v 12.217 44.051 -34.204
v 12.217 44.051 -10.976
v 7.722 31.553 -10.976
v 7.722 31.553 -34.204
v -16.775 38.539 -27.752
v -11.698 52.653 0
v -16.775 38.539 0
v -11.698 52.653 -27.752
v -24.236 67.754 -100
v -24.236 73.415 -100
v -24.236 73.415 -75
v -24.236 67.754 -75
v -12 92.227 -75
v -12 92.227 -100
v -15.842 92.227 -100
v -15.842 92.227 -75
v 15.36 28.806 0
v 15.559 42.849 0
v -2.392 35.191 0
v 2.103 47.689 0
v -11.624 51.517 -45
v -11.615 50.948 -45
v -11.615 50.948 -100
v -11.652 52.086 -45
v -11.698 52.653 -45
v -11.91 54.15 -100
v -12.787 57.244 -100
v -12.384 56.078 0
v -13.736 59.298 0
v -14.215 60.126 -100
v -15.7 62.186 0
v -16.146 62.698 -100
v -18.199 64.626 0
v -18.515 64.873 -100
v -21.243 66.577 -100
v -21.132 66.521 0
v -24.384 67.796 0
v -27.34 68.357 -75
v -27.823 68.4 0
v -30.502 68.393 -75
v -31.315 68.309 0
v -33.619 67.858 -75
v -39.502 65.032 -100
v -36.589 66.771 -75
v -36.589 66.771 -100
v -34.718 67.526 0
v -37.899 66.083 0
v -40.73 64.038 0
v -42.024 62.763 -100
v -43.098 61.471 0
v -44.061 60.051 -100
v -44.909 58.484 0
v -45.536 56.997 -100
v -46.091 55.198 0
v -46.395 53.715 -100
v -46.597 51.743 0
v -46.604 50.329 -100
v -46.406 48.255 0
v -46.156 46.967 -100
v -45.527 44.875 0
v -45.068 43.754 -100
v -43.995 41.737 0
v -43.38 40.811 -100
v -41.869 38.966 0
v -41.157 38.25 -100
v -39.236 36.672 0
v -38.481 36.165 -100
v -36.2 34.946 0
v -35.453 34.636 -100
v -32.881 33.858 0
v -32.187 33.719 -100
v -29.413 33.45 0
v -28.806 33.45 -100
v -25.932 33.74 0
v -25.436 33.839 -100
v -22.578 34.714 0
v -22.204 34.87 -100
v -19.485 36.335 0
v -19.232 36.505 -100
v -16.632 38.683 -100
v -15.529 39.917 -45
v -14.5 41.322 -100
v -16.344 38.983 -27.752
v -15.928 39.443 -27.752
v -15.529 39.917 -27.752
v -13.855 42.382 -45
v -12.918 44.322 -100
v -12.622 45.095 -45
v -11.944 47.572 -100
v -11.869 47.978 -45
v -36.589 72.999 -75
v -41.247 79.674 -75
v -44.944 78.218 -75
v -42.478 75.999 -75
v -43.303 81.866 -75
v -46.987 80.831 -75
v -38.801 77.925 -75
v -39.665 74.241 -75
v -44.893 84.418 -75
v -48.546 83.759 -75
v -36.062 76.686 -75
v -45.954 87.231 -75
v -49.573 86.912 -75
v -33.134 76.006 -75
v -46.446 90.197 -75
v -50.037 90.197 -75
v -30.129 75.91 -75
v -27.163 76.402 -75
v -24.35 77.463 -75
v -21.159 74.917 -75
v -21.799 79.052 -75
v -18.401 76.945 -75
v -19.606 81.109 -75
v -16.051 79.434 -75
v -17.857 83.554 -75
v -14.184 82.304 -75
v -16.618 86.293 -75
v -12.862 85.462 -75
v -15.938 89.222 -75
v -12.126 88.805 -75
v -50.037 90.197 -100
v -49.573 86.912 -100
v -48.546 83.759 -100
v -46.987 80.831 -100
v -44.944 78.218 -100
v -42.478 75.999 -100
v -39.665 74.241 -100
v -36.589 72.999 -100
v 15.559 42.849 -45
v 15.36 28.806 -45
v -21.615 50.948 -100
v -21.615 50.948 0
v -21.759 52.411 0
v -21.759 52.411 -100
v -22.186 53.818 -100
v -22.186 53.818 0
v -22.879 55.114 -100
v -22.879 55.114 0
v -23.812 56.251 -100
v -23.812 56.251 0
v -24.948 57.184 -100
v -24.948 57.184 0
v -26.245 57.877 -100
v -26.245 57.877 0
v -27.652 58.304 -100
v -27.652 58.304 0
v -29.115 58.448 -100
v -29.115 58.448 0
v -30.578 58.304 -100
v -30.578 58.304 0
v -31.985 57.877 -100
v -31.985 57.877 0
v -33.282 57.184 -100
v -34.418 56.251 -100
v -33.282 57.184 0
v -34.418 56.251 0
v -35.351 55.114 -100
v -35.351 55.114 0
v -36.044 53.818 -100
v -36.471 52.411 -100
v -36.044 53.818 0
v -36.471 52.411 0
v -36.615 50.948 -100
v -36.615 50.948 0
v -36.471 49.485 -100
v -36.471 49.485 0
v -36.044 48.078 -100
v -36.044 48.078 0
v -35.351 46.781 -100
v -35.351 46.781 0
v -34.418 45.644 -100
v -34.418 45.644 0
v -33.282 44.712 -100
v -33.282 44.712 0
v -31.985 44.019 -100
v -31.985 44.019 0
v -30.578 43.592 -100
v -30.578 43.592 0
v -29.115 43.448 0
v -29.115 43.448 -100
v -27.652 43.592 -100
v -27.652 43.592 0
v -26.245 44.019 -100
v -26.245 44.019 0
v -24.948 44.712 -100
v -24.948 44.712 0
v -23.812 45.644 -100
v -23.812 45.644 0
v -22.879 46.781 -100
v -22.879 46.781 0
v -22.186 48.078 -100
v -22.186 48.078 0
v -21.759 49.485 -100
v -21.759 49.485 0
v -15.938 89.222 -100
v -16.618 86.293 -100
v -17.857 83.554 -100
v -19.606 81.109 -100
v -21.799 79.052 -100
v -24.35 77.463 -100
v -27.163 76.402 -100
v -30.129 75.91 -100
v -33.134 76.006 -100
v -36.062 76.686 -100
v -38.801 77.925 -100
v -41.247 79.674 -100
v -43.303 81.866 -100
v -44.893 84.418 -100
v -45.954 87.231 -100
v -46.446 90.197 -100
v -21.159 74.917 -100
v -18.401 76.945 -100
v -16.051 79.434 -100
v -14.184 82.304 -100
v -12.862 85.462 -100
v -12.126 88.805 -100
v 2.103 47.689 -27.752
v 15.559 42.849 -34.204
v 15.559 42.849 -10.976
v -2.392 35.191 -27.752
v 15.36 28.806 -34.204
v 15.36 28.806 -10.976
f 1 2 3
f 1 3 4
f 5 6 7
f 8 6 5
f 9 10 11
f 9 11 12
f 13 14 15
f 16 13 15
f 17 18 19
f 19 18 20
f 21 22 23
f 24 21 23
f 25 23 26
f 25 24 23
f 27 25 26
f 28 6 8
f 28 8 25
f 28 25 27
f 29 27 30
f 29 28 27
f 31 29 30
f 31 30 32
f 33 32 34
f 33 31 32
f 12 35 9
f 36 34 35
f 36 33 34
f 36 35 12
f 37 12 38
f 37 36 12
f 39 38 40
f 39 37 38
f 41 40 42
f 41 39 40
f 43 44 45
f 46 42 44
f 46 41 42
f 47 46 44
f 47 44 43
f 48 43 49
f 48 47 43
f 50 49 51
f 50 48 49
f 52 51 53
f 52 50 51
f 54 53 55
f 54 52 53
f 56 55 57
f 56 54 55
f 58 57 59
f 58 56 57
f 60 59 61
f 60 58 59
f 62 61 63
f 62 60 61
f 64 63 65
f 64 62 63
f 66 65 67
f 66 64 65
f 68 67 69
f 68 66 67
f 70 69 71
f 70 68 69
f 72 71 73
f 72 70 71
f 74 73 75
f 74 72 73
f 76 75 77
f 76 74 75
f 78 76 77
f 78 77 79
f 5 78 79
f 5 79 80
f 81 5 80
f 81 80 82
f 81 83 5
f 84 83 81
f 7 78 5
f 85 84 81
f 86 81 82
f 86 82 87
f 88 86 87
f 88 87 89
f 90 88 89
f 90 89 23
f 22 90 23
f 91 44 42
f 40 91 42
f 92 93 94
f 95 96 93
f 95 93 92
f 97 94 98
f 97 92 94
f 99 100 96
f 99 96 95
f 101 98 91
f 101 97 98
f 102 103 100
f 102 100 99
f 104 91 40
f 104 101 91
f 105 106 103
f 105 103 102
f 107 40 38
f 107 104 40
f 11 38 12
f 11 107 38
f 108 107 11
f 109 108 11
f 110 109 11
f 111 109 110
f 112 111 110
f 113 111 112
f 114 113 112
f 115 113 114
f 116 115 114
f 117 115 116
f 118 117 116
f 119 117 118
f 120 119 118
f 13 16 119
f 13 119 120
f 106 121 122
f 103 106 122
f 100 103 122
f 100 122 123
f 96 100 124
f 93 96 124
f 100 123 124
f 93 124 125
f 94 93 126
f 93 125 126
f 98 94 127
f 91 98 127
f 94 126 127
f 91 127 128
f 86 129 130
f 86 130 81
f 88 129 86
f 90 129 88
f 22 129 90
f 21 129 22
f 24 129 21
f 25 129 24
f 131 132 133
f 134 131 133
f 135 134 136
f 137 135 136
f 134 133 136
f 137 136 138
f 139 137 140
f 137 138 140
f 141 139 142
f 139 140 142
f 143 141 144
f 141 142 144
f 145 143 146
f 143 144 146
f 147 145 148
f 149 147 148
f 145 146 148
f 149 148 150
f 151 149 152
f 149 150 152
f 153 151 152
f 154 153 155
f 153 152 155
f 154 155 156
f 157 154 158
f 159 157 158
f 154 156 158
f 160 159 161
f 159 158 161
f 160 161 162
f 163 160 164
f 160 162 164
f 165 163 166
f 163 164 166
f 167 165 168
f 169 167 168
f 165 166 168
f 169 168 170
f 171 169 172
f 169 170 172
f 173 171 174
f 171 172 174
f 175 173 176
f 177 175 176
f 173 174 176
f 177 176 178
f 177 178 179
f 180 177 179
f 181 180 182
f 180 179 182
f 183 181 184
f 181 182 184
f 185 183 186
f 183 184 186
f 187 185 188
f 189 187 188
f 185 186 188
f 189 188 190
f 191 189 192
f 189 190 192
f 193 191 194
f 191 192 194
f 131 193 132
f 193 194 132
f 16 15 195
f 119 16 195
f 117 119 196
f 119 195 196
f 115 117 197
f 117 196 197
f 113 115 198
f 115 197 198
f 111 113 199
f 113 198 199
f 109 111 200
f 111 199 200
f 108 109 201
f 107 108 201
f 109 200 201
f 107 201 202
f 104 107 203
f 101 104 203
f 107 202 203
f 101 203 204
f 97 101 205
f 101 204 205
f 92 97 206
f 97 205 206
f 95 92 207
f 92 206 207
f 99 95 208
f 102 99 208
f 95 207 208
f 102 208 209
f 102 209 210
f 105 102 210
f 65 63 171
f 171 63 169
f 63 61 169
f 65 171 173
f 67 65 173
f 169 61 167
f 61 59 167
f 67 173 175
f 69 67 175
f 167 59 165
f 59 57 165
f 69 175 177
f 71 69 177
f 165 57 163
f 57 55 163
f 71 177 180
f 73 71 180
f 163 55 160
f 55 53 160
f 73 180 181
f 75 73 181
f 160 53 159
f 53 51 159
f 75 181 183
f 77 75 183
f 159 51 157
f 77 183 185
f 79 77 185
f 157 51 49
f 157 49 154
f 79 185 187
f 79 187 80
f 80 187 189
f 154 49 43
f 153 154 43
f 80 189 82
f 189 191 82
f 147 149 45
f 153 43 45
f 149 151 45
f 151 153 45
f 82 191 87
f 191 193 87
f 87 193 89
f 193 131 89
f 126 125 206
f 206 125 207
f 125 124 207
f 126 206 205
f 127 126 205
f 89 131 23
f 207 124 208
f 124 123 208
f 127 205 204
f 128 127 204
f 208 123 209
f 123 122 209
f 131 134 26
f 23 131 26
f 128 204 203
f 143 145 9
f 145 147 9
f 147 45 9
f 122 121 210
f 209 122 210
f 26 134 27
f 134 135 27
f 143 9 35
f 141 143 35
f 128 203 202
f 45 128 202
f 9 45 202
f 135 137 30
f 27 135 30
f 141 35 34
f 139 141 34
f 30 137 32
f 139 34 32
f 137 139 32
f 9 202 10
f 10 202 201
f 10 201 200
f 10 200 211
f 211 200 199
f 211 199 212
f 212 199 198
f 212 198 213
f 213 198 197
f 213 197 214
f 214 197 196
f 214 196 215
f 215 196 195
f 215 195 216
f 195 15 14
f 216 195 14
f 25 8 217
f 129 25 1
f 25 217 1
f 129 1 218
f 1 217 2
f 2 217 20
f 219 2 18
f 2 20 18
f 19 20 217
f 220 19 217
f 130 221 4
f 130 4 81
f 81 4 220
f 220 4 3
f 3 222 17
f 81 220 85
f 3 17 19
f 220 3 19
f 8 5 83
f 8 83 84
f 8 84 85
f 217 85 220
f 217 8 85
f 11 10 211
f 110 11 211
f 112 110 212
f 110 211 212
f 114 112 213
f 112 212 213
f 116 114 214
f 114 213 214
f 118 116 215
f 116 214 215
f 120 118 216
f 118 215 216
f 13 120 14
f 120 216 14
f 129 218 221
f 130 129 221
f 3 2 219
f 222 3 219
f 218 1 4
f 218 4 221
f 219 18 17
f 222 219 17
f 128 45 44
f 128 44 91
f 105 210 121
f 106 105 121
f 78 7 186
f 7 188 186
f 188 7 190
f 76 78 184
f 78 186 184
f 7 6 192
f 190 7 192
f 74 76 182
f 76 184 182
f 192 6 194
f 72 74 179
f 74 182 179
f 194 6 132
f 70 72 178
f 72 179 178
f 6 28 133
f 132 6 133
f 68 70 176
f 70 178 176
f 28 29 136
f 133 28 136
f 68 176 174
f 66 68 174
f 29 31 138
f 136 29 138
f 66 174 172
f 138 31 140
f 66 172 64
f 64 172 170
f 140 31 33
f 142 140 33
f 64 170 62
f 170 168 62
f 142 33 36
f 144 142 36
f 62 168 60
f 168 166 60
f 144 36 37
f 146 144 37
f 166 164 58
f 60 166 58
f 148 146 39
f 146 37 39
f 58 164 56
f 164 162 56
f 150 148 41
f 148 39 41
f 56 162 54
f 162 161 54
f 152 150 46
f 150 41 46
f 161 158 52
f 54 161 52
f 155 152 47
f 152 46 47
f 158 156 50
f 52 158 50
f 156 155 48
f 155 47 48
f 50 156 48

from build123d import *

# Parameters (mm, degrees)
SKETCH3_R           = 17.5
BOSS_EXTRUDE2_DEPTH = 100
SKETCH4_R           = 7.5
CUT_EXTRUDE2_DEPTH  = 100
BOSS_EXTRUDE6_DEPTH = 45
SKETCH18_W          = 14.667250813
SKETCH18_H          = 27.752479941
CUT_EXTRUDE6_DEPTH  = 45
SKETCH19_W          = 15.940771985
SKETCH19_H          = 23.227982035
CUT_EXTRUDE8_DEPTH  = 45
BOSS_EXTRUDE8_DEPTH = 25


with BuildPart() as part:
    # Sketch3 → Boss-Extrude2 (new body)
    with BuildSketch(Plane.XY):
        with Locations((-29.114826613, 50.947684889)):
            Circle(SKETCH3_R)
    extrude(amount=-BOSS_EXTRUDE2_DEPTH)

    # Sketch4 → Cut-Extrude2 (cut)
    with BuildSketch(Plane.XY):
        with Locations((-29.114826613, 50.947684889)):
            Circle(SKETCH4_R)
    extrude(amount=-CUT_EXTRUDE2_DEPTH, mode=Mode.SUBTRACT)

    # Sketch16 → Boss-Extrude6 (add)
    with BuildSketch(Plane.XY):
        Polygon((-11.698148649, 52.653360332), (15.559104196, 42.84895981), (15.359838121, 28.805969908), (-15.52924146, 39.916734066), align=None)
    extrude(amount=-BOSS_EXTRUDE6_DEPTH)

    # Sketch18 → Cut-Extrude6 (cut)
    with BuildSketch(Plane(origin=(15.429488543, 42.895582402, 0), x_dir=(0.940977711, -0.338468532, 0), z_dir=(0.338468532, 0.940977711, 0))):
        with Locations((-21.495577319, 13.876239971)):
            Rectangle(SKETCH18_W, SKETCH18_H)
    extrude(amount=-CUT_EXTRUDE6_DEPTH, mode=Mode.SUBTRACT)

    # Sketch19 → Cut-Extrude8 (cut)
    with BuildSketch(Plane(origin=(15.429488543, 42.895582402, 0), x_dir=(0.940977711, -0.338468532, 0), z_dir=(0.338468532, 0.940977711, 0))):
        with Locations((4.556401634, 22.58985628)):
            Rectangle(SKETCH19_W, SKETCH19_H)
    extrude(amount=-CUT_EXTRUDE8_DEPTH, mode=Mode.SUBTRACT)

    # Sketch20 → Boss-Extrude8 (add)
    with BuildSketch(Plane(origin=(0, 0, -100), x_dir=(-1, 0, 0), z_dir=(0, 0, -1))):
        with BuildLine():
            ThreePointArc((15.84180119, 92.226602563), (30.129018278, 75.909507637), (46.446113204, 90.196724725))
            Line((46.446113204, 90.196724725), (50.037435532, 90.196724725))
            ThreePointArc((50.037435532, 90.196724725), (30.003778847, 72.192945878), (12, 92.226602563))
            Line((12, 92.226602563), (15.84180119, 92.226602563))
        make_face()
        with BuildLine():
            ThreePointArc((36.589403128, 72.998778341), (30.377850806, 72.176669134), (24.235659001, 73.414702098))
            Line((24.235659001, 73.414702098), (24.235659001, 67.753746992))
            ThreePointArc((24.235659001, 67.753746992), (30.50242594, 68.392585809), (36.589403128, 66.771107588))
            Line((36.589403128, 66.771107588), (36.589403128, 72.998778341))
        make_face()
    extrude(amount=-BOSS_EXTRUDE8_DEPTH)


solid = part.part
